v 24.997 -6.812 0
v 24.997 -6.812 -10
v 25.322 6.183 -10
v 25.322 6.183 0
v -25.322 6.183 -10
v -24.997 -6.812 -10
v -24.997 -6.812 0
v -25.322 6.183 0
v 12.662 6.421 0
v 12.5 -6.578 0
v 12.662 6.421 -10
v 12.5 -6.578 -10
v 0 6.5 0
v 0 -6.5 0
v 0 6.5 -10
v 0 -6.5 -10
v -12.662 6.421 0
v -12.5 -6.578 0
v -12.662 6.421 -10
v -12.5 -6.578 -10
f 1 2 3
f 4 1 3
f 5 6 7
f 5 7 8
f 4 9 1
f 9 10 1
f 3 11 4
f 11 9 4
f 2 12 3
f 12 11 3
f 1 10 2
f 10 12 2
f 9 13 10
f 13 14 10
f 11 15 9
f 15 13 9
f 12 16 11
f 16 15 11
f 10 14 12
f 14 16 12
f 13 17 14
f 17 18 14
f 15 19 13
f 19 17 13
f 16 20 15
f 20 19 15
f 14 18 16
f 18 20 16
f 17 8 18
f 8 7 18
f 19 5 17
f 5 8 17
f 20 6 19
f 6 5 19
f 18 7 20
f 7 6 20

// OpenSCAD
// Modul: aussparung
// Erzeugt einen gebogenen Balken (Radius 1m) mit radialer Breite delta_r und Hoehe schiene_tiefe, zentriert.

// Parameter
schiene_laenge = 50;          // Radiale Breite der Aussparung (mm)
schiene_hoehe = 10;   // Hoehe des Balkens (mm)
schiene_tiefe = 13;
monitor_radius = 1000;  // Radius der Biegung (mm)

wand=2;
fn = 512;               // $fn Aufloesung fuer Boegen
//fn=fn*10;

module bogen() {
    angle = schiene_laenge / monitor_radius * 180 / PI;  // Biegung

    translate([0,-monitor_radius-schiene_tiefe/2,-schiene_hoehe])
    rotate([0,0,90-angle/2])
    
    rotate_extrude(angle = angle, $fn=fn)
        translate([monitor_radius, 0])
            square([schiene_tiefe, schiene_hoehe], center = false);
}
// Aufruf des Moduls
bogen();
